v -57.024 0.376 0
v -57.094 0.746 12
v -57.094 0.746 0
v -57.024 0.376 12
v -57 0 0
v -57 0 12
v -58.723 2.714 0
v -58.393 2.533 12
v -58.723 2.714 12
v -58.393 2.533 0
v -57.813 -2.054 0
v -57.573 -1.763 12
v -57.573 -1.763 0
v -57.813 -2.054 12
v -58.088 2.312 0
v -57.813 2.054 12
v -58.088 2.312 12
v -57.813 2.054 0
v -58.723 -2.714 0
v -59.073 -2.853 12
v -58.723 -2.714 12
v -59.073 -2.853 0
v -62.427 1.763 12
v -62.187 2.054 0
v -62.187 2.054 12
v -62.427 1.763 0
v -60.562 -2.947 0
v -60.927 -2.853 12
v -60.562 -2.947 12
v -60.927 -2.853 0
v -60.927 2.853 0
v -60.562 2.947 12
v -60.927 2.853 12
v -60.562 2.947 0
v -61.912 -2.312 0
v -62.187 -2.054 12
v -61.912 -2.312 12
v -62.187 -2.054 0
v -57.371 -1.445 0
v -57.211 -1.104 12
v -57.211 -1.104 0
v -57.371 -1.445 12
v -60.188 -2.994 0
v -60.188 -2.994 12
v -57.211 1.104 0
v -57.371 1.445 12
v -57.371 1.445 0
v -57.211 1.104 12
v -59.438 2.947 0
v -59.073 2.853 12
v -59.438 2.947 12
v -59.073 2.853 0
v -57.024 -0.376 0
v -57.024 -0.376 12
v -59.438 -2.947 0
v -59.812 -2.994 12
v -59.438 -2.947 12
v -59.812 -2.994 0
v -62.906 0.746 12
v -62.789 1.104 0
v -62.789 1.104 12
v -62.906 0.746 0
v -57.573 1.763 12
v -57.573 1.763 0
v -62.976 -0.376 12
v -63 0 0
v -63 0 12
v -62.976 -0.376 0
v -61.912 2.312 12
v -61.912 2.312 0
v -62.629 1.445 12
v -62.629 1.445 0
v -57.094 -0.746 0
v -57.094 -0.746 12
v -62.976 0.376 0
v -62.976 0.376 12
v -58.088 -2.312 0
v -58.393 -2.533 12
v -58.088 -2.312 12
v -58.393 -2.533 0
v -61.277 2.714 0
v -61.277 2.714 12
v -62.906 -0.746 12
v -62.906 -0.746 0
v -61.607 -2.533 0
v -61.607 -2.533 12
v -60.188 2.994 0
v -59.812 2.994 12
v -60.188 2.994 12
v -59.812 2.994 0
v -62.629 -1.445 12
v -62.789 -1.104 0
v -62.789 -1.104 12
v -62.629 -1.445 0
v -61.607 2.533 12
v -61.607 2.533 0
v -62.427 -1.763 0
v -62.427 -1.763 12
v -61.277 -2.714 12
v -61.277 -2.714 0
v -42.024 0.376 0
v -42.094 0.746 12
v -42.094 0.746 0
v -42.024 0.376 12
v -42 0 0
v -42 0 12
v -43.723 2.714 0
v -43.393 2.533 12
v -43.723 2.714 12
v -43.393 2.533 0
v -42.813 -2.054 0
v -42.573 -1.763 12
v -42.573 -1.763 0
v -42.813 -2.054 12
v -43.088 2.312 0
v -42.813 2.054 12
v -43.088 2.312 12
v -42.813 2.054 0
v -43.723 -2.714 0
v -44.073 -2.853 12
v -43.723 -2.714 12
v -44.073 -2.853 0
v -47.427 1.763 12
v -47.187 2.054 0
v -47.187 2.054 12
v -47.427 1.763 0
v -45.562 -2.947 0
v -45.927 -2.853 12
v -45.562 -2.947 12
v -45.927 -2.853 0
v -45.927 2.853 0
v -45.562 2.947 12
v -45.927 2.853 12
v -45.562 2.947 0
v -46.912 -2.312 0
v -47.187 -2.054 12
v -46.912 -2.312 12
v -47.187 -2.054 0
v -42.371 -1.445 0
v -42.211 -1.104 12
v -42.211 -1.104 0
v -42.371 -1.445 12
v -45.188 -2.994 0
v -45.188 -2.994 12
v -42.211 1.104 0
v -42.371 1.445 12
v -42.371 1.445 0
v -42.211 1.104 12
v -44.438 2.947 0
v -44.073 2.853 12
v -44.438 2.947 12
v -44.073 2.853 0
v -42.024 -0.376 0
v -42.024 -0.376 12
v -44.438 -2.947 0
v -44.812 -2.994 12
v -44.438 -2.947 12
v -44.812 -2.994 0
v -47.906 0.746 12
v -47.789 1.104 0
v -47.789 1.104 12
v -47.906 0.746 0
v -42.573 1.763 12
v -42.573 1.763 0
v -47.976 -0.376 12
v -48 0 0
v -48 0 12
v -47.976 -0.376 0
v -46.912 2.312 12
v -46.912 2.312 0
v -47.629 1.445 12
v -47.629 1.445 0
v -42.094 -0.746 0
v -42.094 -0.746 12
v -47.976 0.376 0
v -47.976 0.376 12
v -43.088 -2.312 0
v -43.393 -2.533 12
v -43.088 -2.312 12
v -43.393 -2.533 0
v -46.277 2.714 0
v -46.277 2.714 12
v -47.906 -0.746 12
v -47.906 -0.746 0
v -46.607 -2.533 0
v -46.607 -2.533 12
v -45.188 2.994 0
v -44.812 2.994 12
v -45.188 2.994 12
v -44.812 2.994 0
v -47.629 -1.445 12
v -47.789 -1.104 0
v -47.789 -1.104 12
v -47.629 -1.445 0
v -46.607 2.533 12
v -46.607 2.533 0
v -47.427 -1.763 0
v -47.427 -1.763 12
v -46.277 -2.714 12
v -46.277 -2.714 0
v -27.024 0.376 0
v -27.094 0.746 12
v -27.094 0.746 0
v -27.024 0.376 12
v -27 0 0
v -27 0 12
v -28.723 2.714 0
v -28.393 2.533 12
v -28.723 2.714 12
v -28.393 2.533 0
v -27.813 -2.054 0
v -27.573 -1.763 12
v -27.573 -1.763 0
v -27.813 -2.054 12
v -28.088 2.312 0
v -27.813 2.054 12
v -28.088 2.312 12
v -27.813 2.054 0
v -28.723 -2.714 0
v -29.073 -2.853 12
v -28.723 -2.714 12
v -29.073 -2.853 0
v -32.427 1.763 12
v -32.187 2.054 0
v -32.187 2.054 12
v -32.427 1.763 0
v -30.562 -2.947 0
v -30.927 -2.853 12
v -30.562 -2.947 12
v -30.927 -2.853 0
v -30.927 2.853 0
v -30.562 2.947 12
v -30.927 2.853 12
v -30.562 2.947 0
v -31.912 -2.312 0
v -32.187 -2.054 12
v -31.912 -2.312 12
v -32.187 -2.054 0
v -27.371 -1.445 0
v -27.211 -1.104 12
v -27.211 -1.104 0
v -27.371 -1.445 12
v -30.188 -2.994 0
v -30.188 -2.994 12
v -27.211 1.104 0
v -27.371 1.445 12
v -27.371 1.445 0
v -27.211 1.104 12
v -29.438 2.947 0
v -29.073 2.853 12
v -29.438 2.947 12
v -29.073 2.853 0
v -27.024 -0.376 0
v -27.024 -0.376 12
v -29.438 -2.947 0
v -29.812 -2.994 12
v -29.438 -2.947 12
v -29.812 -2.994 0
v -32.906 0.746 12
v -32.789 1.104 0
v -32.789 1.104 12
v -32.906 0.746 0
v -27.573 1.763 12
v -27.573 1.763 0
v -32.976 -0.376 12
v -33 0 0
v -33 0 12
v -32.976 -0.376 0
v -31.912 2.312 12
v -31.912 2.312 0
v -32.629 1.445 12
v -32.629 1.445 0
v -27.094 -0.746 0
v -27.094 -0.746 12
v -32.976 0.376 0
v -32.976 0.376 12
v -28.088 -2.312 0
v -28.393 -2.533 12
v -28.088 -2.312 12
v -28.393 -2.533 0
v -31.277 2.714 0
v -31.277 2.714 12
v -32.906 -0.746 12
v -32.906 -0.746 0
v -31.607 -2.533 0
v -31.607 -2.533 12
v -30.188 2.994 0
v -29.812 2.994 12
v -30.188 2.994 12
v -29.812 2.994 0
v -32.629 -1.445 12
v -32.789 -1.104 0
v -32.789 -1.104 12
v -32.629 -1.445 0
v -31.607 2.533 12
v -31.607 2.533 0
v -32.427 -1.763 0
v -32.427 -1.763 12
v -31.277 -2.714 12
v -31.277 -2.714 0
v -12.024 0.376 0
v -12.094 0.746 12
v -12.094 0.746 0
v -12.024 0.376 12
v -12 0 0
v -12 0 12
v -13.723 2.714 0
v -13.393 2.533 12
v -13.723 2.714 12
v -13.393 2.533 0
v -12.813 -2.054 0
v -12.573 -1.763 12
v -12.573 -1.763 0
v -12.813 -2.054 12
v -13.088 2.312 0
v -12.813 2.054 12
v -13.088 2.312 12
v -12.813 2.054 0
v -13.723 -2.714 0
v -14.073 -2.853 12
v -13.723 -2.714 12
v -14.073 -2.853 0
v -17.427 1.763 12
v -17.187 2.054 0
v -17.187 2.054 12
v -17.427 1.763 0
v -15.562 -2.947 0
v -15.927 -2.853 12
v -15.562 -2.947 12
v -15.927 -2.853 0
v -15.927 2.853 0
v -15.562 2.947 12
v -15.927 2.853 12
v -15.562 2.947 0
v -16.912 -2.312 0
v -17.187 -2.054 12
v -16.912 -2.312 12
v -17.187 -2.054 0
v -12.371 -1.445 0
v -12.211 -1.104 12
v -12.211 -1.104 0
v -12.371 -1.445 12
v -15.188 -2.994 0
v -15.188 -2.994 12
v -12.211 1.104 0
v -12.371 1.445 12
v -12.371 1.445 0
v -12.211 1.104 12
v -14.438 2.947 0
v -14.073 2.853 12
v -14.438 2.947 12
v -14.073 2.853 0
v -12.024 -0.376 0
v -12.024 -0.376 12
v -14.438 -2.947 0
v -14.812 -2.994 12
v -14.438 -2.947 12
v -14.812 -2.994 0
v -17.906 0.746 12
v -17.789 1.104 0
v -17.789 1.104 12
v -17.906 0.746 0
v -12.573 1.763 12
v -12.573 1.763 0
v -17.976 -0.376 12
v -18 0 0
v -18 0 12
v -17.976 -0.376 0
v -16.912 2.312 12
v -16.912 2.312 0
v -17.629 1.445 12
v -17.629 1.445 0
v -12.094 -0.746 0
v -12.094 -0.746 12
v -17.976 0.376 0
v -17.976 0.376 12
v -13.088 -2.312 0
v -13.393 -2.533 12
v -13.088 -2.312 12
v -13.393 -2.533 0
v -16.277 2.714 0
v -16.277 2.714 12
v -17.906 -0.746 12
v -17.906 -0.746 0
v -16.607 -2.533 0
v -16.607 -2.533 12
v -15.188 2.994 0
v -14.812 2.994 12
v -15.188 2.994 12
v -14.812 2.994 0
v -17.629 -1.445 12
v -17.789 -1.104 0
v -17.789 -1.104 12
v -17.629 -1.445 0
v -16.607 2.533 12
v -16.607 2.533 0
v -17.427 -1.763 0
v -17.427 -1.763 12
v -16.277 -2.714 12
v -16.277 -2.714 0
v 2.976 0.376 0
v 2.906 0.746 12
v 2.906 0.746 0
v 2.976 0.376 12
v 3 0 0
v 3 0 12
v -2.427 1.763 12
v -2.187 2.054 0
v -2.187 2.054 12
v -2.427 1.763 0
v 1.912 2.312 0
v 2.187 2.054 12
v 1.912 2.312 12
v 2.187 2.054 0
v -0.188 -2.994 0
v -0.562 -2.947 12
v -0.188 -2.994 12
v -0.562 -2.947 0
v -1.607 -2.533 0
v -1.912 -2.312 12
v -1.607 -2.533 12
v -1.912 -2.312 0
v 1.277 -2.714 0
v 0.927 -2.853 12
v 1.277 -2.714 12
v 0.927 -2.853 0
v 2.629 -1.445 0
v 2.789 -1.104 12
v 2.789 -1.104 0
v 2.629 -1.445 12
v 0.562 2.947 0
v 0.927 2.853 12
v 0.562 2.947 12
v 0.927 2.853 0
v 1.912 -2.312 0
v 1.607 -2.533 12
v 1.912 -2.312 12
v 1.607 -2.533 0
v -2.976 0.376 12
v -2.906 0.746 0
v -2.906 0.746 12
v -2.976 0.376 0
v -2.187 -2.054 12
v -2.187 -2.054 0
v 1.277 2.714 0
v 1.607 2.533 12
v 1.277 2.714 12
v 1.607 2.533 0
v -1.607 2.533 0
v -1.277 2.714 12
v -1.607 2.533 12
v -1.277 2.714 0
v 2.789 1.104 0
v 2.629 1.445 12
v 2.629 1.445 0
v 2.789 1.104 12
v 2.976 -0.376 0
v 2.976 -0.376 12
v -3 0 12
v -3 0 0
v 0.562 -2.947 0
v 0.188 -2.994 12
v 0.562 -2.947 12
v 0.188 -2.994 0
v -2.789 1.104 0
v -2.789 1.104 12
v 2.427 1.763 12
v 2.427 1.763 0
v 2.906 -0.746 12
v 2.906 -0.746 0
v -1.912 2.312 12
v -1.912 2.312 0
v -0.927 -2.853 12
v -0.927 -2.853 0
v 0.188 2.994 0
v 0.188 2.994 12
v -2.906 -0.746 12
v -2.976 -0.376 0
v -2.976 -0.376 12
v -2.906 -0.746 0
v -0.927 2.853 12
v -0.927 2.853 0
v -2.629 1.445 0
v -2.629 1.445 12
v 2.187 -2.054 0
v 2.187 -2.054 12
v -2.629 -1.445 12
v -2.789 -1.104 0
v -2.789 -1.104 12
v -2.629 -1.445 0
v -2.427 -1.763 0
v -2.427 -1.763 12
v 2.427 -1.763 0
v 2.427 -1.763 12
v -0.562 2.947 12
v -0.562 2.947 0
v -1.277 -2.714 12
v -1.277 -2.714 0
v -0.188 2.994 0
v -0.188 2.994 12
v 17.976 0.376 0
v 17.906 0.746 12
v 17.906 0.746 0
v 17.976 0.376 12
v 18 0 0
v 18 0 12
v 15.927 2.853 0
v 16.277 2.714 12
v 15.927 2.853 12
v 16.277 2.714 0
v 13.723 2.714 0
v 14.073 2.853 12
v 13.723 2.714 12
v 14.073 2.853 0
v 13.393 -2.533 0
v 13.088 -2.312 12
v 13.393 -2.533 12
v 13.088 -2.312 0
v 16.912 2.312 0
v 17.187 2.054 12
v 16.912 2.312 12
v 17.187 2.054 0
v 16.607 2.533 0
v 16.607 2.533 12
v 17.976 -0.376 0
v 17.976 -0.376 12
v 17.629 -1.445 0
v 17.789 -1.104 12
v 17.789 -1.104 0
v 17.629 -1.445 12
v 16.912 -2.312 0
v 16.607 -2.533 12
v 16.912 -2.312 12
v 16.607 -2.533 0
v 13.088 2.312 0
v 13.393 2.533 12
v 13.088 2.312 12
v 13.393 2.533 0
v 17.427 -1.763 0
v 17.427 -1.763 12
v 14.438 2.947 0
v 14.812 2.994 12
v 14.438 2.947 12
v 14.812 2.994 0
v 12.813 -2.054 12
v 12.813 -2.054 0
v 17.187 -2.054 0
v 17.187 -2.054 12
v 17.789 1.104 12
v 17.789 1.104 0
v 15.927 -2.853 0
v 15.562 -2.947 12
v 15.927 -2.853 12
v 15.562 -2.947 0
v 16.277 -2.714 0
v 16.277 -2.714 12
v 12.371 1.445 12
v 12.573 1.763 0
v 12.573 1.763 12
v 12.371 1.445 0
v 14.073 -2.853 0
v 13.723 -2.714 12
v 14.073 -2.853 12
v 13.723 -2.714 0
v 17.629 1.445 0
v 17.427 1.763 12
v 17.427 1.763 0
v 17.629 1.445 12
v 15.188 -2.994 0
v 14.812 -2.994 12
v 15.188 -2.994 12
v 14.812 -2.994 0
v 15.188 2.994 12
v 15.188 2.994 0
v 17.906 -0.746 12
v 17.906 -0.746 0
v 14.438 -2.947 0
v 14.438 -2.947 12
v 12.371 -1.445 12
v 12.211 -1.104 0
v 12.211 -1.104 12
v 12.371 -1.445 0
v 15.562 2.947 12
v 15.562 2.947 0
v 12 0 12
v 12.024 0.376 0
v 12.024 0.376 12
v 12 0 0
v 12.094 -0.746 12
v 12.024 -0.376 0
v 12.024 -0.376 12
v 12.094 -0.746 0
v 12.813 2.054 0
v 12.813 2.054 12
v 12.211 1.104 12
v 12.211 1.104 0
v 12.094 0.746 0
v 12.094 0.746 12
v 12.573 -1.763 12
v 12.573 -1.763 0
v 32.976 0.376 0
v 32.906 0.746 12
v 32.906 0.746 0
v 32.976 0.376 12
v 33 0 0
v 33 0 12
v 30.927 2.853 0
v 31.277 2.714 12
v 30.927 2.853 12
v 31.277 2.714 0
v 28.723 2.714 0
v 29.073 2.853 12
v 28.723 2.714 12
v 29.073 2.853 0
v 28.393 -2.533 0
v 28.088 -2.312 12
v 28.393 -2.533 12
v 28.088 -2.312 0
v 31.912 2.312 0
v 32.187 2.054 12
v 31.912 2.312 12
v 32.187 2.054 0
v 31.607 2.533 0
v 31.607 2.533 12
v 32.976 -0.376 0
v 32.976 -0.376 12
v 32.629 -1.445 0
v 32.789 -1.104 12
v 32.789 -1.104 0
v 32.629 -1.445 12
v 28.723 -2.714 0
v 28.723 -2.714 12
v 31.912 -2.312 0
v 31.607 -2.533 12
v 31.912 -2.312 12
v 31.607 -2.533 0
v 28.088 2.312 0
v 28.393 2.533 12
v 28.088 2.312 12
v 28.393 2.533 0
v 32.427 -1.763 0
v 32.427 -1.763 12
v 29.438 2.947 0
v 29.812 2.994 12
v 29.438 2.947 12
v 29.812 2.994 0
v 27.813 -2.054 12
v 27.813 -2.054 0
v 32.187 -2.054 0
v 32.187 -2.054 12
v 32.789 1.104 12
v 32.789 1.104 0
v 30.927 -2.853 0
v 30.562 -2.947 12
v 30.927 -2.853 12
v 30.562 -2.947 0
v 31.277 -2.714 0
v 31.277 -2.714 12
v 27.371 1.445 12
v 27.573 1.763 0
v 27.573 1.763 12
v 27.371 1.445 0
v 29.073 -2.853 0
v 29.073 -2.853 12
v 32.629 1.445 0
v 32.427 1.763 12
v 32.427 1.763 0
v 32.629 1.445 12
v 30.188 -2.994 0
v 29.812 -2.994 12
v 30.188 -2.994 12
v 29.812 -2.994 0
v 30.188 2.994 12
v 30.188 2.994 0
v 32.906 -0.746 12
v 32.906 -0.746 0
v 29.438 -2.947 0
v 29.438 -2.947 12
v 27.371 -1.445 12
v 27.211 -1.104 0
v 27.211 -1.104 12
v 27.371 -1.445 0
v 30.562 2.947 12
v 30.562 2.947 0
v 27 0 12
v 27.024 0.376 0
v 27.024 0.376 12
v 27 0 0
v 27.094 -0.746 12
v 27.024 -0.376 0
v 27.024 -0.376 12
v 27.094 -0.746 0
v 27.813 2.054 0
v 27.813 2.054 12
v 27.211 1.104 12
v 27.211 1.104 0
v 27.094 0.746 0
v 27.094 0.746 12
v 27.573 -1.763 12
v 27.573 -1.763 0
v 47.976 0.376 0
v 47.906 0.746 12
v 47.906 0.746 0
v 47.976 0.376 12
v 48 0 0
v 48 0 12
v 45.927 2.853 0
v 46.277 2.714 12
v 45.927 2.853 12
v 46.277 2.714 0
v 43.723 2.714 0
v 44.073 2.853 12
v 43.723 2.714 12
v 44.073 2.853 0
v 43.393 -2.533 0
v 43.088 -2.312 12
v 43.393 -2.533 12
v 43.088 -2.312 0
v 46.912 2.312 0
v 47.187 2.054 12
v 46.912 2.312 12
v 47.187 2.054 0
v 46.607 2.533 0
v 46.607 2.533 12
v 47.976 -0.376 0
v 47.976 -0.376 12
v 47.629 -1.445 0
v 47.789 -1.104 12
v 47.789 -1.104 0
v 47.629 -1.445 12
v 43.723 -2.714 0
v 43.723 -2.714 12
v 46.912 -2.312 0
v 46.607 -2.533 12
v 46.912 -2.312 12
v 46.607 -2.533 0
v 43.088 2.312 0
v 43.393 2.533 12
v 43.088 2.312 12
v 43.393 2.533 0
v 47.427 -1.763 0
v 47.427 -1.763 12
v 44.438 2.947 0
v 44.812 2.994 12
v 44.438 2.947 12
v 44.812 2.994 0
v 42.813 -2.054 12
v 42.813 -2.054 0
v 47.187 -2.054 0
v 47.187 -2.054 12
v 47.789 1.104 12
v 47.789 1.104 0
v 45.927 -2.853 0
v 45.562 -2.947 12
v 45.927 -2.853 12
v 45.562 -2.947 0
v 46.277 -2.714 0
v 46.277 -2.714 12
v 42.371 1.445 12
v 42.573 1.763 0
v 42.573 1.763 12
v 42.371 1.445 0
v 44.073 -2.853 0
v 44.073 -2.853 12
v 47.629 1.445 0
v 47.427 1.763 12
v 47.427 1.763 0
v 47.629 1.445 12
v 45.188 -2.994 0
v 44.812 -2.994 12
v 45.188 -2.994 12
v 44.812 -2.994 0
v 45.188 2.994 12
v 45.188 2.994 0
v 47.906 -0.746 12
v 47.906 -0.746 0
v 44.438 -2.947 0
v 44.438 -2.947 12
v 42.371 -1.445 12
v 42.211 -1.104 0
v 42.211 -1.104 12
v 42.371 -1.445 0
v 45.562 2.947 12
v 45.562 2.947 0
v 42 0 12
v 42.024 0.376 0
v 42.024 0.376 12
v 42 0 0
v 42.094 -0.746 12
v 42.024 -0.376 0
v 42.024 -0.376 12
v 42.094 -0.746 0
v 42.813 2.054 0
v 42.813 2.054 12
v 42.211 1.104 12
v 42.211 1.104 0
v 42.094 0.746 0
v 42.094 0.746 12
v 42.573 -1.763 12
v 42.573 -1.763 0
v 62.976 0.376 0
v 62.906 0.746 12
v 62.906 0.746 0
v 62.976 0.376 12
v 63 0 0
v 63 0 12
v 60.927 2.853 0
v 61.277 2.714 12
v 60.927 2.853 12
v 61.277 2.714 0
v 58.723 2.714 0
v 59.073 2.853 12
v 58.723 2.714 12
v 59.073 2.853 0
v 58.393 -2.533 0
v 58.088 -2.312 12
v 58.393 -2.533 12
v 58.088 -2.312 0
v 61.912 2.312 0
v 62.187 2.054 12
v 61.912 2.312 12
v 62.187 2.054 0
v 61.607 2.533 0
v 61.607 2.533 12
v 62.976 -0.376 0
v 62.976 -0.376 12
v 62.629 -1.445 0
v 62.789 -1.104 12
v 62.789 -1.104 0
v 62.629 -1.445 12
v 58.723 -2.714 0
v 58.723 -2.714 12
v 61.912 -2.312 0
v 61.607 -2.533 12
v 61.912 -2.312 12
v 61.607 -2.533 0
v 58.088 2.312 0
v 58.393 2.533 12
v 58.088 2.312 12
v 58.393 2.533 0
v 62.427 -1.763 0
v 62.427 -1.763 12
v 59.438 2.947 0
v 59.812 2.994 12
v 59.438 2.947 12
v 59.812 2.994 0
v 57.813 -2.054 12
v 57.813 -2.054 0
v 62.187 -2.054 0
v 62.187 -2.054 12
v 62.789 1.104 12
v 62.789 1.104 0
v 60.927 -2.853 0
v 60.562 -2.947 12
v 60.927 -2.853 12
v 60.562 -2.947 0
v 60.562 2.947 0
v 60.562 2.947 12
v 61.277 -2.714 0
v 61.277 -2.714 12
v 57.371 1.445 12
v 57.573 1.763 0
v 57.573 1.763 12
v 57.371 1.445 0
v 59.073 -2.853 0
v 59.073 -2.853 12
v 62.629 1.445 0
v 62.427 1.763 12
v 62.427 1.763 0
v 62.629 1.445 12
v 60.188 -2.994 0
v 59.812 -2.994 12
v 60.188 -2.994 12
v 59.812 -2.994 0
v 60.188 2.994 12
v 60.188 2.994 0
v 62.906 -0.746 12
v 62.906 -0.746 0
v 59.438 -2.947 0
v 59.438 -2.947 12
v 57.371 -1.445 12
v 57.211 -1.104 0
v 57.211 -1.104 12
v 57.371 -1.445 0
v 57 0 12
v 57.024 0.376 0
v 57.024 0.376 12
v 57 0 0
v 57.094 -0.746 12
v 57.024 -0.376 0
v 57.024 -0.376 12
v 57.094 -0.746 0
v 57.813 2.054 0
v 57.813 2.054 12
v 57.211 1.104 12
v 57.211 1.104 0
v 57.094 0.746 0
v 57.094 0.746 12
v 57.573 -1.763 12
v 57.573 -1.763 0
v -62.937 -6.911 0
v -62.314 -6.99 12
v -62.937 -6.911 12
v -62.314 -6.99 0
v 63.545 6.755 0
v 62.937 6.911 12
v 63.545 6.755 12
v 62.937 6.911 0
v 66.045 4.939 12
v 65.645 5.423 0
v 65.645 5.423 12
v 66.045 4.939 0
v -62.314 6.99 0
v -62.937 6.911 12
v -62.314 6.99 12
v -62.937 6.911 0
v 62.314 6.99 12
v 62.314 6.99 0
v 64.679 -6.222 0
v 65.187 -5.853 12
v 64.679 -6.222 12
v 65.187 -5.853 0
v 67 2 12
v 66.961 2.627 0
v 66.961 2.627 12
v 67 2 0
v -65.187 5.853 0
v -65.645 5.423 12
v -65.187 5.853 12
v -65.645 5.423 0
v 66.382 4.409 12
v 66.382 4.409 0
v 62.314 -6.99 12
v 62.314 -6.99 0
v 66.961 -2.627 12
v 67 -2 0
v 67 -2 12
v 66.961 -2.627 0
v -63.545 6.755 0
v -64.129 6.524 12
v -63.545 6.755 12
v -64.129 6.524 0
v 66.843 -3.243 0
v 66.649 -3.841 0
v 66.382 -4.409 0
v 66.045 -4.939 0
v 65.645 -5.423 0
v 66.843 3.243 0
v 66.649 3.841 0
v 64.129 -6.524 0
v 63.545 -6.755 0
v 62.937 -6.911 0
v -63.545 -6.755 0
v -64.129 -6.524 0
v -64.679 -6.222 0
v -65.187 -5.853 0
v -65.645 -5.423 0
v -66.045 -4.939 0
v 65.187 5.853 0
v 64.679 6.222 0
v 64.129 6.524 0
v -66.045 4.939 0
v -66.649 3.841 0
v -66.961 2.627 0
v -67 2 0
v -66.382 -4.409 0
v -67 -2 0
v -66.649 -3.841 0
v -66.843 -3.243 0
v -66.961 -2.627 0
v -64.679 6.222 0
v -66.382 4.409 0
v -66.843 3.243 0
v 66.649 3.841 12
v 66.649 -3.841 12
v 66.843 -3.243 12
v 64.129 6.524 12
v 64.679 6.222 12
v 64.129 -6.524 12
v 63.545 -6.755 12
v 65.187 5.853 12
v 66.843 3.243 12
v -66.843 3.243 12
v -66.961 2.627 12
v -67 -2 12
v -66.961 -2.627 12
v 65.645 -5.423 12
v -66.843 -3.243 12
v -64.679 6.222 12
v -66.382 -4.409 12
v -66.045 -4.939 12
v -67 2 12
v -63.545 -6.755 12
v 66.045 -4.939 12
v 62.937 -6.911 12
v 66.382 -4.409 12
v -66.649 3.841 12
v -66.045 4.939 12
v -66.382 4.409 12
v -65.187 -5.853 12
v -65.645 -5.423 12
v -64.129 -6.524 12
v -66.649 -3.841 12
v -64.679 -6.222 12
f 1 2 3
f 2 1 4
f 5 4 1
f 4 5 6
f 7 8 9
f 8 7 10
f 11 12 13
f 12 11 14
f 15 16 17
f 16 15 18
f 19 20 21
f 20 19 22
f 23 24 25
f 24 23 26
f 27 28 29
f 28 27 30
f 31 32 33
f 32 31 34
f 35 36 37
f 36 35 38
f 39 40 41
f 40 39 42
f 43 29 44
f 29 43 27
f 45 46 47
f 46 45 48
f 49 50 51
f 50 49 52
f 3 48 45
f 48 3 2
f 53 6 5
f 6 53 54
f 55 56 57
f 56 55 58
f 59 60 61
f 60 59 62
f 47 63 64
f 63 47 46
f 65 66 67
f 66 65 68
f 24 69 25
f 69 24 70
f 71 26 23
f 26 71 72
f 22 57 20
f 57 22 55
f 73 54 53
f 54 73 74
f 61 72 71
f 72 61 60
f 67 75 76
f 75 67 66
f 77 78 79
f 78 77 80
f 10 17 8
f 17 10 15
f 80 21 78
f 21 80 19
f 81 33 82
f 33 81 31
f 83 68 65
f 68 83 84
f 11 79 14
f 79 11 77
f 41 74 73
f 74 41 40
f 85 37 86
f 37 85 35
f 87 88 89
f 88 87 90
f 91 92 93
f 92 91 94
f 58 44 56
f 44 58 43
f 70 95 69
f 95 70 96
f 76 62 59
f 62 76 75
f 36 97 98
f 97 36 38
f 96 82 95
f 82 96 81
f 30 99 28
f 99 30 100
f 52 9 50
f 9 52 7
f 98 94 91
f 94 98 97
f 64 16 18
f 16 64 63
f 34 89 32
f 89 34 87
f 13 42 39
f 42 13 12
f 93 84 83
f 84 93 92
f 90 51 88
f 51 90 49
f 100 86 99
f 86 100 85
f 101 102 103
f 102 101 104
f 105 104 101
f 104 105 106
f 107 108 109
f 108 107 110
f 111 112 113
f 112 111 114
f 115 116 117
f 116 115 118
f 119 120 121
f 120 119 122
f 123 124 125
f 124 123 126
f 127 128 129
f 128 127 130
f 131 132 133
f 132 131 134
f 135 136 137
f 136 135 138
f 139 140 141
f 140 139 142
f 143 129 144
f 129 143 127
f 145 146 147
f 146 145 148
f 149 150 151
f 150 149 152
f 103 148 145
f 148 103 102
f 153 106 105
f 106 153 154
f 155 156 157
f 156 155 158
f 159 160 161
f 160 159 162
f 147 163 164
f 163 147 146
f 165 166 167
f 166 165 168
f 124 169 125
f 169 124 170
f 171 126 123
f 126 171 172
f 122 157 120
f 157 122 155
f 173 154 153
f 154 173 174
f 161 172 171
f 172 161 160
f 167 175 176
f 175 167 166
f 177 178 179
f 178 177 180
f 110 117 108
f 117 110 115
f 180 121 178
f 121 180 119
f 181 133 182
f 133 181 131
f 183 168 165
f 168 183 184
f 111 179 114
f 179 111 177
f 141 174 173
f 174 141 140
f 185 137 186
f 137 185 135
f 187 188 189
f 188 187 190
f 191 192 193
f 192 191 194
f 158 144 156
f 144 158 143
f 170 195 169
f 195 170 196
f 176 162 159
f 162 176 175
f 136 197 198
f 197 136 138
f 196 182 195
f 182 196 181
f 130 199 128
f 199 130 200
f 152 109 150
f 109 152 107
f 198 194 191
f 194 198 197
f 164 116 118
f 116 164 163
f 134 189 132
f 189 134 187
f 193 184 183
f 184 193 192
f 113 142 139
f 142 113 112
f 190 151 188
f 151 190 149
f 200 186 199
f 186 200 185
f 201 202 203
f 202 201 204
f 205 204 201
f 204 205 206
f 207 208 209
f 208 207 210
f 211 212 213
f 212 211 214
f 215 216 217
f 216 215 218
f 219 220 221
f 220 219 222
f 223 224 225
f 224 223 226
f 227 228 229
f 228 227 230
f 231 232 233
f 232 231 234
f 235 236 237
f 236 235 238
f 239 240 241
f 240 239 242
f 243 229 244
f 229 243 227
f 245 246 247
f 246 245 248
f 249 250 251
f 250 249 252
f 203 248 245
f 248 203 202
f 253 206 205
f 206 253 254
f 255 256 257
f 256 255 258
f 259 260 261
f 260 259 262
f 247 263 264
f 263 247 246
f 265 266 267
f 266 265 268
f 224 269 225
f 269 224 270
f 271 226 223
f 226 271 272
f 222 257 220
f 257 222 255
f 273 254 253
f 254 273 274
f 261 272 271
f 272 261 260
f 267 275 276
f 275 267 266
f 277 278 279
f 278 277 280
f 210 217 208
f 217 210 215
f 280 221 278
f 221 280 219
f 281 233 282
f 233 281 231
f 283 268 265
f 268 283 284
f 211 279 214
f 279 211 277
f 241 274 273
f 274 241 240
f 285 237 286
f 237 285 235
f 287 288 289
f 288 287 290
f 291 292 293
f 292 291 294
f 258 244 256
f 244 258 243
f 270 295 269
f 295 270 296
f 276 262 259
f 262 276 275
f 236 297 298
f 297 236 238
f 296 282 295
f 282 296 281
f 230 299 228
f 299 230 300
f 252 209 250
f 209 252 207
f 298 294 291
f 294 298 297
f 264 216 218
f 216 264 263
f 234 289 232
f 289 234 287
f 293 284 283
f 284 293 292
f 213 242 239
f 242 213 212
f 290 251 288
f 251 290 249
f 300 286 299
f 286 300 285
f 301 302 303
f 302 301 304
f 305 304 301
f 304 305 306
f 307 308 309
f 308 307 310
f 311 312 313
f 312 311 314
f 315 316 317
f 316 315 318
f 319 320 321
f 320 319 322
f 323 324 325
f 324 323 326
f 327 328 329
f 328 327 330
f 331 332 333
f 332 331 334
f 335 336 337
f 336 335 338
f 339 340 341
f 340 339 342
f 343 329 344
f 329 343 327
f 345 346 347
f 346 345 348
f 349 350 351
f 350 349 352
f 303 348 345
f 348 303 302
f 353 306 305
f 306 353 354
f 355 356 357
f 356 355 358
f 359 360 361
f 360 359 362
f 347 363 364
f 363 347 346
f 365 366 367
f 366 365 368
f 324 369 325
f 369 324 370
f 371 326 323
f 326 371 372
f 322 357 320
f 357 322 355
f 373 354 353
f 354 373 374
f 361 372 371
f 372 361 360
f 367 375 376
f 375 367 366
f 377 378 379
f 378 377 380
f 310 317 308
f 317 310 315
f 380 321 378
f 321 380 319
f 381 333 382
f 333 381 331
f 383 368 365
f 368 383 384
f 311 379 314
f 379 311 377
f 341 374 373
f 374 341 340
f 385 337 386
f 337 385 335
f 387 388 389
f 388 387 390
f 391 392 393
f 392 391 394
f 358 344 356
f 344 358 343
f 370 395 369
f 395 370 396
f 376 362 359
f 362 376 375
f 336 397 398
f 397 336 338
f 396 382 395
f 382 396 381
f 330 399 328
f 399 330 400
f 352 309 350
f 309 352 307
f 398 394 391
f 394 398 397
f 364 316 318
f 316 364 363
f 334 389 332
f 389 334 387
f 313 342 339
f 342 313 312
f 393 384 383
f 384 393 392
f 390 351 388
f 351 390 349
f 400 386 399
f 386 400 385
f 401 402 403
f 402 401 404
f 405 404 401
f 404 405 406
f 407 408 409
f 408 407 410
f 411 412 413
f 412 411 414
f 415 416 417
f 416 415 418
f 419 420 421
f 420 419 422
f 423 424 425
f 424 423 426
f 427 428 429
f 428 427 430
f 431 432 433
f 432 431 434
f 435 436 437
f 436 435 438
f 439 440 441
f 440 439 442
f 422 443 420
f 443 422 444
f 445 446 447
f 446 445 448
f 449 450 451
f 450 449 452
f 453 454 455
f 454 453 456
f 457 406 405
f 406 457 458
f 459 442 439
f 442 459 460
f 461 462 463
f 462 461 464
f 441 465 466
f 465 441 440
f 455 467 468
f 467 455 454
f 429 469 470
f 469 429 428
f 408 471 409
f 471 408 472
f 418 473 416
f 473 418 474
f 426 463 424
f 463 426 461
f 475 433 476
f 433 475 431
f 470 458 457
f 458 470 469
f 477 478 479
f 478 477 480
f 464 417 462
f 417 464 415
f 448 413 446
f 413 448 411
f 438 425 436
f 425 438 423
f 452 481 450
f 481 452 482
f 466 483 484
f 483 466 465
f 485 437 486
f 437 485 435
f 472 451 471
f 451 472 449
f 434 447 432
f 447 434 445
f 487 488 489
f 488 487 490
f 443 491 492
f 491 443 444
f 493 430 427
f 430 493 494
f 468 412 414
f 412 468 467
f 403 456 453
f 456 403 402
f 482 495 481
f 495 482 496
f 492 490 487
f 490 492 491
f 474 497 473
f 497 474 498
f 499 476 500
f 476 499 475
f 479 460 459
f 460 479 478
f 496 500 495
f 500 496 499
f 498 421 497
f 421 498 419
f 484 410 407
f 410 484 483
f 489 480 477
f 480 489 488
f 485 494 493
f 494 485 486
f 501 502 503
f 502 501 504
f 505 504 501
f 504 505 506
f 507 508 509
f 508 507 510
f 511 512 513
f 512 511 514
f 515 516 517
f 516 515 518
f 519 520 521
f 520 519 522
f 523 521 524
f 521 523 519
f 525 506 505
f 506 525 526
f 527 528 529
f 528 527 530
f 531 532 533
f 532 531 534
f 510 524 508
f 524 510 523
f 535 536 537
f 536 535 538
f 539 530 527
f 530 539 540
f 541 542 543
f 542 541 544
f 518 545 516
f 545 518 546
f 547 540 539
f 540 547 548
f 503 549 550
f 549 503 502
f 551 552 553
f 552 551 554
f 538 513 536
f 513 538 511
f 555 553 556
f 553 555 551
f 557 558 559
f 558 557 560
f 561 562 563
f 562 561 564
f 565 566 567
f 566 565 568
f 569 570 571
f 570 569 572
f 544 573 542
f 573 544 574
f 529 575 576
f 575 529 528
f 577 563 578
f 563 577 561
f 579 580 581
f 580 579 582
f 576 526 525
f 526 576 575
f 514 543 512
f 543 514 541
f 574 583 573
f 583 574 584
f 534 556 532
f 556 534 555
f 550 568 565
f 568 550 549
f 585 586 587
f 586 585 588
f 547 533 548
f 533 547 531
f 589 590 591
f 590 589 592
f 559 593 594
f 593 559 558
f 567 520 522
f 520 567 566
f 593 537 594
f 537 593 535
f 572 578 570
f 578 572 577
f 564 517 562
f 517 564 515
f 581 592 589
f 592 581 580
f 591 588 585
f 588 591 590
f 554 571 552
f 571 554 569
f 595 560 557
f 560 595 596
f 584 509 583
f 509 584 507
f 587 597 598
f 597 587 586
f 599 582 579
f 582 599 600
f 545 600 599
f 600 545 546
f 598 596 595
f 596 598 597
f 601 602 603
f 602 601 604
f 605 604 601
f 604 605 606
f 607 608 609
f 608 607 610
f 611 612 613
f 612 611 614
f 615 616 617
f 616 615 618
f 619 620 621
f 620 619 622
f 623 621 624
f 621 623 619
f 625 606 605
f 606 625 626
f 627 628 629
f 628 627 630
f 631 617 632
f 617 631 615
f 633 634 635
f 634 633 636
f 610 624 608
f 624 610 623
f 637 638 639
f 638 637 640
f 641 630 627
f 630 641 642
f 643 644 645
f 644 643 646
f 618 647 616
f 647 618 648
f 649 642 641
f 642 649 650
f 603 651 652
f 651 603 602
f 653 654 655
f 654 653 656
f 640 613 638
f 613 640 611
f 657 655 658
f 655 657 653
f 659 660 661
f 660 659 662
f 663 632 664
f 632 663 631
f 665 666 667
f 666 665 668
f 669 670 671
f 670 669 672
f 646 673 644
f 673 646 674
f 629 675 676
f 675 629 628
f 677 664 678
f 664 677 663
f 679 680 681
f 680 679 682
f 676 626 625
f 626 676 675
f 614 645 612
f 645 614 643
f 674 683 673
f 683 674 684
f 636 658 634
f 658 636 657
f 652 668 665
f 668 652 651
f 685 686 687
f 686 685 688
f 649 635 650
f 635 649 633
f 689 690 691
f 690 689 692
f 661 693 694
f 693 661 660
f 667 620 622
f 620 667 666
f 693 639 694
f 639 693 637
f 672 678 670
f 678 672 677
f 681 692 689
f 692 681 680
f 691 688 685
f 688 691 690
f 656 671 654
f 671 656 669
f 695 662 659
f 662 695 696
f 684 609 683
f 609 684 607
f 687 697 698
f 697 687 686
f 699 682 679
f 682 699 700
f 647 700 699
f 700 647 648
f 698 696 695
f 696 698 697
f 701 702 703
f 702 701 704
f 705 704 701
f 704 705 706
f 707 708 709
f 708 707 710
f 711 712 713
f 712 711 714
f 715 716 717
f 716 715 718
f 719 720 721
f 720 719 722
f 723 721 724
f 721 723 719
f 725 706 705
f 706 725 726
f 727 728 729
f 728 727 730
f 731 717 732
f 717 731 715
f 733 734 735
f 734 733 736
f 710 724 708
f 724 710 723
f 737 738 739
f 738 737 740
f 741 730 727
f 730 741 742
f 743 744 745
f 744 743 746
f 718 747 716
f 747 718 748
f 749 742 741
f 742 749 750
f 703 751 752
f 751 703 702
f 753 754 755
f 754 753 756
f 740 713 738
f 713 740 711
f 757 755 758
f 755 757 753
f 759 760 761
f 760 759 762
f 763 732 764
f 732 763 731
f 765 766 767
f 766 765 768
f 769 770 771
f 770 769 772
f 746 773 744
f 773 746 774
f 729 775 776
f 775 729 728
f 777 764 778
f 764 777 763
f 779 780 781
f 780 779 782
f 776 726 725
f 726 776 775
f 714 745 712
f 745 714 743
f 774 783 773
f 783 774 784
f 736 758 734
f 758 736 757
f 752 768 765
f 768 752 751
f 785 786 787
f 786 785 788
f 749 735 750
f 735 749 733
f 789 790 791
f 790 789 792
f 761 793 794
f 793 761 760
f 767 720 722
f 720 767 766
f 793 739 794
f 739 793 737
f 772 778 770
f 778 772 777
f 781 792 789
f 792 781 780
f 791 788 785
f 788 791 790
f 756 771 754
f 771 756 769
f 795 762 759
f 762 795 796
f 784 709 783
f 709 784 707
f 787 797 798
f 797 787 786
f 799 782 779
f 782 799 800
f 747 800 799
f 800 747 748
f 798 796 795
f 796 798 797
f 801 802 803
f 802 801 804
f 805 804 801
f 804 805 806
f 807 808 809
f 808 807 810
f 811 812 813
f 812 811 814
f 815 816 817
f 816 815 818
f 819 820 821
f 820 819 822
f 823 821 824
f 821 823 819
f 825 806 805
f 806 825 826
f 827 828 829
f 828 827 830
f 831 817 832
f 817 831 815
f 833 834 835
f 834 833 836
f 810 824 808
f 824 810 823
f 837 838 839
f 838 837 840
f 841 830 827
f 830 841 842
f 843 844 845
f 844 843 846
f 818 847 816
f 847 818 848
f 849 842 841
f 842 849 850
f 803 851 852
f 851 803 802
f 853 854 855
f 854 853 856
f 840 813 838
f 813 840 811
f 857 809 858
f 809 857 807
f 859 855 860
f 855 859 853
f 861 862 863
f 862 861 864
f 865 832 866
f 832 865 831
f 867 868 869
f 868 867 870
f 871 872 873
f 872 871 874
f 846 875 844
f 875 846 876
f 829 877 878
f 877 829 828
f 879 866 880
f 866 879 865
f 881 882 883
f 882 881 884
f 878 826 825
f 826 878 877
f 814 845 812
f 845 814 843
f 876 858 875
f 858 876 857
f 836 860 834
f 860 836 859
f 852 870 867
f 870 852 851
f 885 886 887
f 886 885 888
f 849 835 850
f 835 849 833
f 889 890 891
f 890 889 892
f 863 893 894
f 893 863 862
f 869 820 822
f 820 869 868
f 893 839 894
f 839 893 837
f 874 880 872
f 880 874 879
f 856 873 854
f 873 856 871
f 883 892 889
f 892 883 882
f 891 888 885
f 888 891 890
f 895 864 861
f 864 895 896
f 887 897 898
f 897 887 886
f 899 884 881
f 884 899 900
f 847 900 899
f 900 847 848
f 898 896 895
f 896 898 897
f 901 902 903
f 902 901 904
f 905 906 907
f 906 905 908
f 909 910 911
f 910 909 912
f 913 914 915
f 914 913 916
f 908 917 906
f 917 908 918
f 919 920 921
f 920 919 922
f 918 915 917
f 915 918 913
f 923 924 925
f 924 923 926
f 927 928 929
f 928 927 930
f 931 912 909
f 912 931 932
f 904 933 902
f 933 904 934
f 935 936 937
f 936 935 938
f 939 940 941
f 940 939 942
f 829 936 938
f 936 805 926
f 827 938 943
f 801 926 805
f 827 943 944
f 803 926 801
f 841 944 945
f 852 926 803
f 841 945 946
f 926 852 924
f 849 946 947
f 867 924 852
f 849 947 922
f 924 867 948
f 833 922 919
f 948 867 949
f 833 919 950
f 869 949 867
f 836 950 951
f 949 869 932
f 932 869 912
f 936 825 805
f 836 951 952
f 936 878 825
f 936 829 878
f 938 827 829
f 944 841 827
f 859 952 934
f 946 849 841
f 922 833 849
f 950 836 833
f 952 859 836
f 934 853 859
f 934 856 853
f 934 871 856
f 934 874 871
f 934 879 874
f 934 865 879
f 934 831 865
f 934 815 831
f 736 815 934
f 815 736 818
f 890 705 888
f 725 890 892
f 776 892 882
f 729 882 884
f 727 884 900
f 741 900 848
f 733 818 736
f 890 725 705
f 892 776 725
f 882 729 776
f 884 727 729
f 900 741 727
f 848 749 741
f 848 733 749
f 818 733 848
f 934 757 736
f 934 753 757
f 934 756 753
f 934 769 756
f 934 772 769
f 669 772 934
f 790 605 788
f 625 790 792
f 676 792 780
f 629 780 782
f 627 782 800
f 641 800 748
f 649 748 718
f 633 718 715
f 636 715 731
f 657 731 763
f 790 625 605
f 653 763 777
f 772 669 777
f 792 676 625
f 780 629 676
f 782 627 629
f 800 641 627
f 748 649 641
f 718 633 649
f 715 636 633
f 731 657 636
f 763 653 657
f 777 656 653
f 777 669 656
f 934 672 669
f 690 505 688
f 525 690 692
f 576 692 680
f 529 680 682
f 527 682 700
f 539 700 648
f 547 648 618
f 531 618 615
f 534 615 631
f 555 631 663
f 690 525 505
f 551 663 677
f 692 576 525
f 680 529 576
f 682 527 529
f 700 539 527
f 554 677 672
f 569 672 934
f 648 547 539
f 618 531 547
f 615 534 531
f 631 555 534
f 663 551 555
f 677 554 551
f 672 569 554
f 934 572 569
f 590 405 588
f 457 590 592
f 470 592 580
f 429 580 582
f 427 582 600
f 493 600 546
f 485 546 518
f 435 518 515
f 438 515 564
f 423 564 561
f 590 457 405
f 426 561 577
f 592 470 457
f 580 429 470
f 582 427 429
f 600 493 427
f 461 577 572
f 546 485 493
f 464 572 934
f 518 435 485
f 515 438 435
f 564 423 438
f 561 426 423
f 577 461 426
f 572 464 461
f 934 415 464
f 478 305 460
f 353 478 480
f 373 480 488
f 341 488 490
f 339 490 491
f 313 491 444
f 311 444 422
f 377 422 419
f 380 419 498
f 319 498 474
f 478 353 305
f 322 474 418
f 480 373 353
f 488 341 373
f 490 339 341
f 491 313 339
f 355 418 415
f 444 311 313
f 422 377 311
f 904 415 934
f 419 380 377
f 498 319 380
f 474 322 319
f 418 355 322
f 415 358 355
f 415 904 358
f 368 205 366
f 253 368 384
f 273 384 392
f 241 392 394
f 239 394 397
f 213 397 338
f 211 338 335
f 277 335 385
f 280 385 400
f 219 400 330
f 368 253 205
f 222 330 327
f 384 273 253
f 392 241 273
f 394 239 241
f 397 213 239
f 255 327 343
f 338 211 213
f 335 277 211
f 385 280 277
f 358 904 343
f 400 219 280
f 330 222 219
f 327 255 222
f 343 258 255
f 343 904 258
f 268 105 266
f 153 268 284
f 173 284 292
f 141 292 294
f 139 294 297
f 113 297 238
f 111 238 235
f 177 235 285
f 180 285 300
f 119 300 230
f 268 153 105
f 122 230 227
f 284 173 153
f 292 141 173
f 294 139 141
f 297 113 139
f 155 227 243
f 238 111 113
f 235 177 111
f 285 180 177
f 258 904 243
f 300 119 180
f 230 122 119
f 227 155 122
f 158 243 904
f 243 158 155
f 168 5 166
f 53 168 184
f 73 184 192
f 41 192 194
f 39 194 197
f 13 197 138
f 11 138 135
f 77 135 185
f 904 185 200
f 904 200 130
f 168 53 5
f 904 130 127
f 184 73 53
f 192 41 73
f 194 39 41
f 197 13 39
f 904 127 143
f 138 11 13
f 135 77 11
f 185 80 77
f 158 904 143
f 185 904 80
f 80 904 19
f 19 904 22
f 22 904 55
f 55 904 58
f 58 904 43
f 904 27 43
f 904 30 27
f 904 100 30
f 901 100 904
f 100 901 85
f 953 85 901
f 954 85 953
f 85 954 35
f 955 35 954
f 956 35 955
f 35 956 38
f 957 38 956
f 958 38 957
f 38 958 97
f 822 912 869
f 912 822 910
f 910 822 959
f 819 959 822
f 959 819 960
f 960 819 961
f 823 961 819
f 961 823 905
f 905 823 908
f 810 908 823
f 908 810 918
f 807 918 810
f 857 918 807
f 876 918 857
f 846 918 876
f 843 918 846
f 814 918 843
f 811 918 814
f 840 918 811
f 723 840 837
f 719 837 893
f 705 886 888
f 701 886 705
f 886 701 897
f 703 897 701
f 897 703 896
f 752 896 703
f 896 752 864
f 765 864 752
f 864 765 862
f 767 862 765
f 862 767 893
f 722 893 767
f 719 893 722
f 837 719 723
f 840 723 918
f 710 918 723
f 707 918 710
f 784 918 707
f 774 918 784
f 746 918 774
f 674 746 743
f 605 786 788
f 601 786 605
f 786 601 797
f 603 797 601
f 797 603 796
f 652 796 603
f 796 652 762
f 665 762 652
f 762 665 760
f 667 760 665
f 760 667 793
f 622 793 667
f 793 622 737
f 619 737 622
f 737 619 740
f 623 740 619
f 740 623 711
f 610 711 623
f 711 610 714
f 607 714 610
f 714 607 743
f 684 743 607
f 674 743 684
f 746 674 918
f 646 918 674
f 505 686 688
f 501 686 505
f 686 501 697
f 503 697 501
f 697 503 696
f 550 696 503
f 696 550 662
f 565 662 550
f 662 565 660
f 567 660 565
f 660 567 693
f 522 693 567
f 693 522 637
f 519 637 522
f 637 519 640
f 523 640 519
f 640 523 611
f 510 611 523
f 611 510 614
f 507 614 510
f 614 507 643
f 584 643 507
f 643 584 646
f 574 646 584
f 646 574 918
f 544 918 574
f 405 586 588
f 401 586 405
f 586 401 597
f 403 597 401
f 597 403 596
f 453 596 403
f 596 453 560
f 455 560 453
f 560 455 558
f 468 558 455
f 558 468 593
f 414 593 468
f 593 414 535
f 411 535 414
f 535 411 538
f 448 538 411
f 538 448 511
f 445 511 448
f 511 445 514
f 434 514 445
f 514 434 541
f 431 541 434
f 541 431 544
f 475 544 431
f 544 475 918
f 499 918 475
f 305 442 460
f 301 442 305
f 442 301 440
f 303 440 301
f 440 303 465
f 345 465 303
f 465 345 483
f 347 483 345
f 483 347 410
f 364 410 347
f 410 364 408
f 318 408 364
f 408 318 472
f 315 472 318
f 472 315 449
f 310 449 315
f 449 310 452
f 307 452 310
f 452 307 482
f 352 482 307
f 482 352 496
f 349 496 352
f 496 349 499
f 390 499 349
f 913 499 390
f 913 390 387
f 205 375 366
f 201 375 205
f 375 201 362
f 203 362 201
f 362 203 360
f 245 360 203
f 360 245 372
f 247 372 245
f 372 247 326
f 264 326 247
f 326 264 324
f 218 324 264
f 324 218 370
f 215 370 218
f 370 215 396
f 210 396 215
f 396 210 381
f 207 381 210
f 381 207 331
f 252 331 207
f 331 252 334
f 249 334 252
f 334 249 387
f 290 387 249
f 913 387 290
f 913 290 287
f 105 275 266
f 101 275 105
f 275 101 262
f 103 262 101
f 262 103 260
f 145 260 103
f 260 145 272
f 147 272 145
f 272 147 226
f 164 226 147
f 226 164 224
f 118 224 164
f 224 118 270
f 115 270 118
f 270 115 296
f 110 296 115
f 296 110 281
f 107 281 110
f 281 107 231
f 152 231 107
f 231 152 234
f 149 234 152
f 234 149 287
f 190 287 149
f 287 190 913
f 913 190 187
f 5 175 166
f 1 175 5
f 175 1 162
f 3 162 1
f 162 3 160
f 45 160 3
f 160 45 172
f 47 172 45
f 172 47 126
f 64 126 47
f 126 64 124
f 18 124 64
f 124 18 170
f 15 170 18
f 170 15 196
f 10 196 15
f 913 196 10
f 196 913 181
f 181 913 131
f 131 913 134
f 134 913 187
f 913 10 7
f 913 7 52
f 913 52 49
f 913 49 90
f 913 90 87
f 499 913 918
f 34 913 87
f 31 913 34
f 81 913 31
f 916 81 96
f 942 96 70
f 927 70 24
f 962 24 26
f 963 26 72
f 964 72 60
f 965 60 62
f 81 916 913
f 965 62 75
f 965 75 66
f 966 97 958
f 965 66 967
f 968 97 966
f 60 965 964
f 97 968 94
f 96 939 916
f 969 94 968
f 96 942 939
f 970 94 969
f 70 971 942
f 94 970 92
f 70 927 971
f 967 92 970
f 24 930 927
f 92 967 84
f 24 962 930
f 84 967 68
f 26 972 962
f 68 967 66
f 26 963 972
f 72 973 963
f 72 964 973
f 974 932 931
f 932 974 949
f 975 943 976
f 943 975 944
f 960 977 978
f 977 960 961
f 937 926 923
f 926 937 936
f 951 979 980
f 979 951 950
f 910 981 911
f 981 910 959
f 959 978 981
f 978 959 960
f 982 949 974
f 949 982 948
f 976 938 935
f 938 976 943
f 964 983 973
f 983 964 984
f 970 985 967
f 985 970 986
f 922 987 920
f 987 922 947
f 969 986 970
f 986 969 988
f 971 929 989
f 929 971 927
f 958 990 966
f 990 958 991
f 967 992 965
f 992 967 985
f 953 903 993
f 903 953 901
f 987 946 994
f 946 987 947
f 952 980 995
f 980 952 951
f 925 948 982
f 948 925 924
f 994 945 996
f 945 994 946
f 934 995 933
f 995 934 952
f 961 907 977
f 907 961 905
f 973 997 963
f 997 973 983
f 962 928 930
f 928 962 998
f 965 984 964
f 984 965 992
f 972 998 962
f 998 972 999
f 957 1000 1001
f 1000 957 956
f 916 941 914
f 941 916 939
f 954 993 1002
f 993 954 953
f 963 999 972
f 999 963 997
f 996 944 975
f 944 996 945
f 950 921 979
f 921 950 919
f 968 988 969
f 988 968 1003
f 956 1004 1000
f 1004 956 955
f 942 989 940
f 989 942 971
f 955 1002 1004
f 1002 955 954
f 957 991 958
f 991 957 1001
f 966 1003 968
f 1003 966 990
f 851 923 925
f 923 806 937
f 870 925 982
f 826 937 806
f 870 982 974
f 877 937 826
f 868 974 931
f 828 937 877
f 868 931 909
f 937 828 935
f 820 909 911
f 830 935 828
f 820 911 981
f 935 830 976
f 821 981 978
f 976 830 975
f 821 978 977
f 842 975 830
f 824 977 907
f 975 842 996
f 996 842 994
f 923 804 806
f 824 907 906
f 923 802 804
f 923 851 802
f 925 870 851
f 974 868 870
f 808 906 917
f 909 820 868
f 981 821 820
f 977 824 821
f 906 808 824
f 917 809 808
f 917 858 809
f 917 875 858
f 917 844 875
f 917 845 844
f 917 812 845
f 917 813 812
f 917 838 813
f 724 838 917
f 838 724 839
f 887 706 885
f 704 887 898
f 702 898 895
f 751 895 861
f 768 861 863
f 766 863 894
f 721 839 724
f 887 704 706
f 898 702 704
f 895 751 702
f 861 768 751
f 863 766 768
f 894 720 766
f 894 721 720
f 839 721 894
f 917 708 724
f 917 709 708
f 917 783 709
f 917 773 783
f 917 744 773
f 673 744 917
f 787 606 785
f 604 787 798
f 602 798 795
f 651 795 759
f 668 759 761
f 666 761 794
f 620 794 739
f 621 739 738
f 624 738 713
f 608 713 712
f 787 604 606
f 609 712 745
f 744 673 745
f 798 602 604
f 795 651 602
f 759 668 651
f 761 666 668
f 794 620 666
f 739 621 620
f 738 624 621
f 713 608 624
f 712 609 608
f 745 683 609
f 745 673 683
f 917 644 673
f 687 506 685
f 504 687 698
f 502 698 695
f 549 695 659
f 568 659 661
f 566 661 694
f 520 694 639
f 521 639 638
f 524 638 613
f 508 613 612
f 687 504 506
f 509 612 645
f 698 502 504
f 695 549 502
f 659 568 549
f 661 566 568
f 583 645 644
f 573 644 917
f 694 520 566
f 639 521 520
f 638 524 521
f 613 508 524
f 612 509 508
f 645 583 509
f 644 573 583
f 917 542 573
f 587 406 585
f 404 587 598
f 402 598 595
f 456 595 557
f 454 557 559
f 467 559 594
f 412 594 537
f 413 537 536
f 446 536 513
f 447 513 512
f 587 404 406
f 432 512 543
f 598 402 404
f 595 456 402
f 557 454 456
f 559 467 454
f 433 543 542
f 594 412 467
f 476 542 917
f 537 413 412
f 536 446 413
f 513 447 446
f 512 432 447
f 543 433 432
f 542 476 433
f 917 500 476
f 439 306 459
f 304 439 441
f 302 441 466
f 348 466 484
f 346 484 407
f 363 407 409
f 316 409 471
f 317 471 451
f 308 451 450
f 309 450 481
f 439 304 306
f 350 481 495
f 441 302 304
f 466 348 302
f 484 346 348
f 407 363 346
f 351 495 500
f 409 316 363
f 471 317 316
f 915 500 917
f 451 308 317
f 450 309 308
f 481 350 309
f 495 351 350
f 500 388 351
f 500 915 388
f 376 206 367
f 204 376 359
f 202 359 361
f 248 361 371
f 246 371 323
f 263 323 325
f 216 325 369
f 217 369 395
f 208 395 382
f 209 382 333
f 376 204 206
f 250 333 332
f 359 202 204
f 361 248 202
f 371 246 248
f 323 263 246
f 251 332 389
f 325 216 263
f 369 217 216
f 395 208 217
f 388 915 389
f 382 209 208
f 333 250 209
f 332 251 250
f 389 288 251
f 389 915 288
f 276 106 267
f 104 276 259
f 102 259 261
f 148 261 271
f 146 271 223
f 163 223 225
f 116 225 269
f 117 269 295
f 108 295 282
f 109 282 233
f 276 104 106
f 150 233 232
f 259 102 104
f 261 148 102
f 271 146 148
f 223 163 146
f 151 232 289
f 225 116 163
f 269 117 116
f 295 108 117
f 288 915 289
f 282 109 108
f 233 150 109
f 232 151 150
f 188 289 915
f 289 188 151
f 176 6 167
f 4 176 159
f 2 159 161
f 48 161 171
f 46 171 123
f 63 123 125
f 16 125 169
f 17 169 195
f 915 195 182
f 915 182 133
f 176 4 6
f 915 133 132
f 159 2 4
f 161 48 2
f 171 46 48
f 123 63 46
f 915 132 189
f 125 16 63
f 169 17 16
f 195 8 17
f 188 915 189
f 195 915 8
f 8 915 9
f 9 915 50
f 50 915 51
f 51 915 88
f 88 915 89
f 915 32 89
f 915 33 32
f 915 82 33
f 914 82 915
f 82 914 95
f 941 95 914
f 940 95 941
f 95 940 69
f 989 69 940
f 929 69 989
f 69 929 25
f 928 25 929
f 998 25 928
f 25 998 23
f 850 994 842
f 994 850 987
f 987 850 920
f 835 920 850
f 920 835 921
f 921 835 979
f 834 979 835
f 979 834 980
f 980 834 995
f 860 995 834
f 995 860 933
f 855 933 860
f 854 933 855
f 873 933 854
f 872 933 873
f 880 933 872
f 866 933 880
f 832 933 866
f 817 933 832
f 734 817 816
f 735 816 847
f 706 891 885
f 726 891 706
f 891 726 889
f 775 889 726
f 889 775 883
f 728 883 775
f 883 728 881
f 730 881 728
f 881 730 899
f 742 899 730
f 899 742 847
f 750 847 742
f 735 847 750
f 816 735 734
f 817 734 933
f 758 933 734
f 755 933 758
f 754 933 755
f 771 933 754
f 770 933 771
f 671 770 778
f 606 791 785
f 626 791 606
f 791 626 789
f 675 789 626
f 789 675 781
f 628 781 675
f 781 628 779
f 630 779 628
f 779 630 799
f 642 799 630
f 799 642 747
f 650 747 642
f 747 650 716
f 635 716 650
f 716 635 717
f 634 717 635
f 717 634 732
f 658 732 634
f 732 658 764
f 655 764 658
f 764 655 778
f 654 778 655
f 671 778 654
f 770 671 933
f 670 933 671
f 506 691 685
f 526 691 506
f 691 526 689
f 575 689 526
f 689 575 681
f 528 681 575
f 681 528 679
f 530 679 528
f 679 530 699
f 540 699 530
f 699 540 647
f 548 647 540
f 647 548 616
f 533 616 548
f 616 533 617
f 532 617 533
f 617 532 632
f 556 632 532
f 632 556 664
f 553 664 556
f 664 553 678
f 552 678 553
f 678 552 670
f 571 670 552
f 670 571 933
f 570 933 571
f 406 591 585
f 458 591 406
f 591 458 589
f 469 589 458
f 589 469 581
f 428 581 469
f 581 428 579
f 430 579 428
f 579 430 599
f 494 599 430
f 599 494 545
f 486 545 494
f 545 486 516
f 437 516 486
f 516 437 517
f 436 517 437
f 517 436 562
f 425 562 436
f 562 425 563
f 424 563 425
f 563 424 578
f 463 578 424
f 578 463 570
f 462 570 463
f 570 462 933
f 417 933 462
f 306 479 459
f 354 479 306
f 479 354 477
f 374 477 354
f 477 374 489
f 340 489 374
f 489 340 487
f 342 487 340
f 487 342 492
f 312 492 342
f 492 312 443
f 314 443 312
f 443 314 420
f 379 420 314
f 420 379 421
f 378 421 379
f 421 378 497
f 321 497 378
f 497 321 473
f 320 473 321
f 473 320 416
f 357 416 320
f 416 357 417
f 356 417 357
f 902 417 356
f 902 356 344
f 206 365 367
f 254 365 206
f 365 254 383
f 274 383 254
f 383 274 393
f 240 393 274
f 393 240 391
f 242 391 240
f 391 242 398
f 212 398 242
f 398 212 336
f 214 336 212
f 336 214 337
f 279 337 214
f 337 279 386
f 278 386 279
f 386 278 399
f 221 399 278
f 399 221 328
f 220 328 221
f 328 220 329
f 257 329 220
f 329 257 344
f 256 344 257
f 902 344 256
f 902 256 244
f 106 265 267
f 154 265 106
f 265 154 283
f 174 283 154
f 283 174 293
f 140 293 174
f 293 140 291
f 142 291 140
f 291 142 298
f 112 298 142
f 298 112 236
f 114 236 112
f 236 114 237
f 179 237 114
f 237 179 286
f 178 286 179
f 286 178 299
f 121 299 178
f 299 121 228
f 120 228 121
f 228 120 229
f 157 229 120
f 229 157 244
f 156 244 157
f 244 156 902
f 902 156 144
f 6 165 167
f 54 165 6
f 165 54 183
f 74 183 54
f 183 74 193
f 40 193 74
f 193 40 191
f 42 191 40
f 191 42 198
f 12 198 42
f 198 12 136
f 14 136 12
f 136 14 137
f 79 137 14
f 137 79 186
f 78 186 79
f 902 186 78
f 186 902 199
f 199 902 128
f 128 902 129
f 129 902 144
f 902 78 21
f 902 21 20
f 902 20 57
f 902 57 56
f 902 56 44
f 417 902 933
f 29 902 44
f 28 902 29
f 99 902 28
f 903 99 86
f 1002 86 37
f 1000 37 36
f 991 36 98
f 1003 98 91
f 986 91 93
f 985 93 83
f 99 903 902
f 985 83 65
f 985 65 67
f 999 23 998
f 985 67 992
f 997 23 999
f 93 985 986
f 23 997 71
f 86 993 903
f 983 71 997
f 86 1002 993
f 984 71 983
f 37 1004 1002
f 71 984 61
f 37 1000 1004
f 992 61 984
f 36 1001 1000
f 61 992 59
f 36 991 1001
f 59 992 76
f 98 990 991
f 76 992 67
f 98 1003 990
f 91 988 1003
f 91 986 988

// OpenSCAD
$fn = 50;


difference() {
	union() {
		hull() {
			translate(v = [-62.0000000000, 2.0000000000, 0]) {
				cylinder(h = 12, r = 5);
			}
			translate(v = [62.0000000000, 2.0000000000, 0]) {
				cylinder(h = 12, r = 5);
			}
			translate(v = [-62.0000000000, -2.0000000000, 0]) {
				cylinder(h = 12, r = 5);
			}
			translate(v = [62.0000000000, -2.0000000000, 0]) {
				cylinder(h = 12, r = 5);
			}
		}
	}
	union() {
		translate(v = [-60.0000000000, 0.0000000000, 0]) {
			translate(v = [0, 0, -100]) {
				cylinder(h = 200, r = 3.0000000000);
			}
		}
		translate(v = [-45.0000000000, 0.0000000000, 0]) {
			translate(v = [0, 0, -100]) {
				cylinder(h = 200, r = 3.0000000000);
			}
		}
		translate(v = [-30.0000000000, 0.0000000000, 0]) {
			translate(v = [0, 0, -100]) {
				cylinder(h = 200, r = 3.0000000000);
			}
		}
		translate(v = [-15.0000000000, 0.0000000000, 0]) {
			translate(v = [0, 0, -100]) {
				cylinder(h = 200, r = 3.0000000000);
			}
		}
		translate(v = [0, 0, -100]) {
			cylinder(h = 200, r = 3.0000000000);
		}
		translate(v = [15.0000000000, 0.0000000000, 0]) {
			translate(v = [0, 0, -100]) {
				cylinder(h = 200, r = 3.0000000000);
			}
		}
		translate(v = [30.0000000000, 0.0000000000, 0]) {
			translate(v = [0, 0, -100]) {
				cylinder(h = 200, r = 3.0000000000);
			}
		}
		translate(v = [45.0000000000, 0.0000000000, 0]) {
			translate(v = [0, 0, -100]) {
				cylinder(h = 200, r = 3.0000000000);
			}
		}
		translate(v = [60.0000000000, 0.0000000000, 0]) {
			translate(v = [0, 0, -100]) {
				cylinder(h = 200, r = 3.0000000000);
			}
		}
	}
}
